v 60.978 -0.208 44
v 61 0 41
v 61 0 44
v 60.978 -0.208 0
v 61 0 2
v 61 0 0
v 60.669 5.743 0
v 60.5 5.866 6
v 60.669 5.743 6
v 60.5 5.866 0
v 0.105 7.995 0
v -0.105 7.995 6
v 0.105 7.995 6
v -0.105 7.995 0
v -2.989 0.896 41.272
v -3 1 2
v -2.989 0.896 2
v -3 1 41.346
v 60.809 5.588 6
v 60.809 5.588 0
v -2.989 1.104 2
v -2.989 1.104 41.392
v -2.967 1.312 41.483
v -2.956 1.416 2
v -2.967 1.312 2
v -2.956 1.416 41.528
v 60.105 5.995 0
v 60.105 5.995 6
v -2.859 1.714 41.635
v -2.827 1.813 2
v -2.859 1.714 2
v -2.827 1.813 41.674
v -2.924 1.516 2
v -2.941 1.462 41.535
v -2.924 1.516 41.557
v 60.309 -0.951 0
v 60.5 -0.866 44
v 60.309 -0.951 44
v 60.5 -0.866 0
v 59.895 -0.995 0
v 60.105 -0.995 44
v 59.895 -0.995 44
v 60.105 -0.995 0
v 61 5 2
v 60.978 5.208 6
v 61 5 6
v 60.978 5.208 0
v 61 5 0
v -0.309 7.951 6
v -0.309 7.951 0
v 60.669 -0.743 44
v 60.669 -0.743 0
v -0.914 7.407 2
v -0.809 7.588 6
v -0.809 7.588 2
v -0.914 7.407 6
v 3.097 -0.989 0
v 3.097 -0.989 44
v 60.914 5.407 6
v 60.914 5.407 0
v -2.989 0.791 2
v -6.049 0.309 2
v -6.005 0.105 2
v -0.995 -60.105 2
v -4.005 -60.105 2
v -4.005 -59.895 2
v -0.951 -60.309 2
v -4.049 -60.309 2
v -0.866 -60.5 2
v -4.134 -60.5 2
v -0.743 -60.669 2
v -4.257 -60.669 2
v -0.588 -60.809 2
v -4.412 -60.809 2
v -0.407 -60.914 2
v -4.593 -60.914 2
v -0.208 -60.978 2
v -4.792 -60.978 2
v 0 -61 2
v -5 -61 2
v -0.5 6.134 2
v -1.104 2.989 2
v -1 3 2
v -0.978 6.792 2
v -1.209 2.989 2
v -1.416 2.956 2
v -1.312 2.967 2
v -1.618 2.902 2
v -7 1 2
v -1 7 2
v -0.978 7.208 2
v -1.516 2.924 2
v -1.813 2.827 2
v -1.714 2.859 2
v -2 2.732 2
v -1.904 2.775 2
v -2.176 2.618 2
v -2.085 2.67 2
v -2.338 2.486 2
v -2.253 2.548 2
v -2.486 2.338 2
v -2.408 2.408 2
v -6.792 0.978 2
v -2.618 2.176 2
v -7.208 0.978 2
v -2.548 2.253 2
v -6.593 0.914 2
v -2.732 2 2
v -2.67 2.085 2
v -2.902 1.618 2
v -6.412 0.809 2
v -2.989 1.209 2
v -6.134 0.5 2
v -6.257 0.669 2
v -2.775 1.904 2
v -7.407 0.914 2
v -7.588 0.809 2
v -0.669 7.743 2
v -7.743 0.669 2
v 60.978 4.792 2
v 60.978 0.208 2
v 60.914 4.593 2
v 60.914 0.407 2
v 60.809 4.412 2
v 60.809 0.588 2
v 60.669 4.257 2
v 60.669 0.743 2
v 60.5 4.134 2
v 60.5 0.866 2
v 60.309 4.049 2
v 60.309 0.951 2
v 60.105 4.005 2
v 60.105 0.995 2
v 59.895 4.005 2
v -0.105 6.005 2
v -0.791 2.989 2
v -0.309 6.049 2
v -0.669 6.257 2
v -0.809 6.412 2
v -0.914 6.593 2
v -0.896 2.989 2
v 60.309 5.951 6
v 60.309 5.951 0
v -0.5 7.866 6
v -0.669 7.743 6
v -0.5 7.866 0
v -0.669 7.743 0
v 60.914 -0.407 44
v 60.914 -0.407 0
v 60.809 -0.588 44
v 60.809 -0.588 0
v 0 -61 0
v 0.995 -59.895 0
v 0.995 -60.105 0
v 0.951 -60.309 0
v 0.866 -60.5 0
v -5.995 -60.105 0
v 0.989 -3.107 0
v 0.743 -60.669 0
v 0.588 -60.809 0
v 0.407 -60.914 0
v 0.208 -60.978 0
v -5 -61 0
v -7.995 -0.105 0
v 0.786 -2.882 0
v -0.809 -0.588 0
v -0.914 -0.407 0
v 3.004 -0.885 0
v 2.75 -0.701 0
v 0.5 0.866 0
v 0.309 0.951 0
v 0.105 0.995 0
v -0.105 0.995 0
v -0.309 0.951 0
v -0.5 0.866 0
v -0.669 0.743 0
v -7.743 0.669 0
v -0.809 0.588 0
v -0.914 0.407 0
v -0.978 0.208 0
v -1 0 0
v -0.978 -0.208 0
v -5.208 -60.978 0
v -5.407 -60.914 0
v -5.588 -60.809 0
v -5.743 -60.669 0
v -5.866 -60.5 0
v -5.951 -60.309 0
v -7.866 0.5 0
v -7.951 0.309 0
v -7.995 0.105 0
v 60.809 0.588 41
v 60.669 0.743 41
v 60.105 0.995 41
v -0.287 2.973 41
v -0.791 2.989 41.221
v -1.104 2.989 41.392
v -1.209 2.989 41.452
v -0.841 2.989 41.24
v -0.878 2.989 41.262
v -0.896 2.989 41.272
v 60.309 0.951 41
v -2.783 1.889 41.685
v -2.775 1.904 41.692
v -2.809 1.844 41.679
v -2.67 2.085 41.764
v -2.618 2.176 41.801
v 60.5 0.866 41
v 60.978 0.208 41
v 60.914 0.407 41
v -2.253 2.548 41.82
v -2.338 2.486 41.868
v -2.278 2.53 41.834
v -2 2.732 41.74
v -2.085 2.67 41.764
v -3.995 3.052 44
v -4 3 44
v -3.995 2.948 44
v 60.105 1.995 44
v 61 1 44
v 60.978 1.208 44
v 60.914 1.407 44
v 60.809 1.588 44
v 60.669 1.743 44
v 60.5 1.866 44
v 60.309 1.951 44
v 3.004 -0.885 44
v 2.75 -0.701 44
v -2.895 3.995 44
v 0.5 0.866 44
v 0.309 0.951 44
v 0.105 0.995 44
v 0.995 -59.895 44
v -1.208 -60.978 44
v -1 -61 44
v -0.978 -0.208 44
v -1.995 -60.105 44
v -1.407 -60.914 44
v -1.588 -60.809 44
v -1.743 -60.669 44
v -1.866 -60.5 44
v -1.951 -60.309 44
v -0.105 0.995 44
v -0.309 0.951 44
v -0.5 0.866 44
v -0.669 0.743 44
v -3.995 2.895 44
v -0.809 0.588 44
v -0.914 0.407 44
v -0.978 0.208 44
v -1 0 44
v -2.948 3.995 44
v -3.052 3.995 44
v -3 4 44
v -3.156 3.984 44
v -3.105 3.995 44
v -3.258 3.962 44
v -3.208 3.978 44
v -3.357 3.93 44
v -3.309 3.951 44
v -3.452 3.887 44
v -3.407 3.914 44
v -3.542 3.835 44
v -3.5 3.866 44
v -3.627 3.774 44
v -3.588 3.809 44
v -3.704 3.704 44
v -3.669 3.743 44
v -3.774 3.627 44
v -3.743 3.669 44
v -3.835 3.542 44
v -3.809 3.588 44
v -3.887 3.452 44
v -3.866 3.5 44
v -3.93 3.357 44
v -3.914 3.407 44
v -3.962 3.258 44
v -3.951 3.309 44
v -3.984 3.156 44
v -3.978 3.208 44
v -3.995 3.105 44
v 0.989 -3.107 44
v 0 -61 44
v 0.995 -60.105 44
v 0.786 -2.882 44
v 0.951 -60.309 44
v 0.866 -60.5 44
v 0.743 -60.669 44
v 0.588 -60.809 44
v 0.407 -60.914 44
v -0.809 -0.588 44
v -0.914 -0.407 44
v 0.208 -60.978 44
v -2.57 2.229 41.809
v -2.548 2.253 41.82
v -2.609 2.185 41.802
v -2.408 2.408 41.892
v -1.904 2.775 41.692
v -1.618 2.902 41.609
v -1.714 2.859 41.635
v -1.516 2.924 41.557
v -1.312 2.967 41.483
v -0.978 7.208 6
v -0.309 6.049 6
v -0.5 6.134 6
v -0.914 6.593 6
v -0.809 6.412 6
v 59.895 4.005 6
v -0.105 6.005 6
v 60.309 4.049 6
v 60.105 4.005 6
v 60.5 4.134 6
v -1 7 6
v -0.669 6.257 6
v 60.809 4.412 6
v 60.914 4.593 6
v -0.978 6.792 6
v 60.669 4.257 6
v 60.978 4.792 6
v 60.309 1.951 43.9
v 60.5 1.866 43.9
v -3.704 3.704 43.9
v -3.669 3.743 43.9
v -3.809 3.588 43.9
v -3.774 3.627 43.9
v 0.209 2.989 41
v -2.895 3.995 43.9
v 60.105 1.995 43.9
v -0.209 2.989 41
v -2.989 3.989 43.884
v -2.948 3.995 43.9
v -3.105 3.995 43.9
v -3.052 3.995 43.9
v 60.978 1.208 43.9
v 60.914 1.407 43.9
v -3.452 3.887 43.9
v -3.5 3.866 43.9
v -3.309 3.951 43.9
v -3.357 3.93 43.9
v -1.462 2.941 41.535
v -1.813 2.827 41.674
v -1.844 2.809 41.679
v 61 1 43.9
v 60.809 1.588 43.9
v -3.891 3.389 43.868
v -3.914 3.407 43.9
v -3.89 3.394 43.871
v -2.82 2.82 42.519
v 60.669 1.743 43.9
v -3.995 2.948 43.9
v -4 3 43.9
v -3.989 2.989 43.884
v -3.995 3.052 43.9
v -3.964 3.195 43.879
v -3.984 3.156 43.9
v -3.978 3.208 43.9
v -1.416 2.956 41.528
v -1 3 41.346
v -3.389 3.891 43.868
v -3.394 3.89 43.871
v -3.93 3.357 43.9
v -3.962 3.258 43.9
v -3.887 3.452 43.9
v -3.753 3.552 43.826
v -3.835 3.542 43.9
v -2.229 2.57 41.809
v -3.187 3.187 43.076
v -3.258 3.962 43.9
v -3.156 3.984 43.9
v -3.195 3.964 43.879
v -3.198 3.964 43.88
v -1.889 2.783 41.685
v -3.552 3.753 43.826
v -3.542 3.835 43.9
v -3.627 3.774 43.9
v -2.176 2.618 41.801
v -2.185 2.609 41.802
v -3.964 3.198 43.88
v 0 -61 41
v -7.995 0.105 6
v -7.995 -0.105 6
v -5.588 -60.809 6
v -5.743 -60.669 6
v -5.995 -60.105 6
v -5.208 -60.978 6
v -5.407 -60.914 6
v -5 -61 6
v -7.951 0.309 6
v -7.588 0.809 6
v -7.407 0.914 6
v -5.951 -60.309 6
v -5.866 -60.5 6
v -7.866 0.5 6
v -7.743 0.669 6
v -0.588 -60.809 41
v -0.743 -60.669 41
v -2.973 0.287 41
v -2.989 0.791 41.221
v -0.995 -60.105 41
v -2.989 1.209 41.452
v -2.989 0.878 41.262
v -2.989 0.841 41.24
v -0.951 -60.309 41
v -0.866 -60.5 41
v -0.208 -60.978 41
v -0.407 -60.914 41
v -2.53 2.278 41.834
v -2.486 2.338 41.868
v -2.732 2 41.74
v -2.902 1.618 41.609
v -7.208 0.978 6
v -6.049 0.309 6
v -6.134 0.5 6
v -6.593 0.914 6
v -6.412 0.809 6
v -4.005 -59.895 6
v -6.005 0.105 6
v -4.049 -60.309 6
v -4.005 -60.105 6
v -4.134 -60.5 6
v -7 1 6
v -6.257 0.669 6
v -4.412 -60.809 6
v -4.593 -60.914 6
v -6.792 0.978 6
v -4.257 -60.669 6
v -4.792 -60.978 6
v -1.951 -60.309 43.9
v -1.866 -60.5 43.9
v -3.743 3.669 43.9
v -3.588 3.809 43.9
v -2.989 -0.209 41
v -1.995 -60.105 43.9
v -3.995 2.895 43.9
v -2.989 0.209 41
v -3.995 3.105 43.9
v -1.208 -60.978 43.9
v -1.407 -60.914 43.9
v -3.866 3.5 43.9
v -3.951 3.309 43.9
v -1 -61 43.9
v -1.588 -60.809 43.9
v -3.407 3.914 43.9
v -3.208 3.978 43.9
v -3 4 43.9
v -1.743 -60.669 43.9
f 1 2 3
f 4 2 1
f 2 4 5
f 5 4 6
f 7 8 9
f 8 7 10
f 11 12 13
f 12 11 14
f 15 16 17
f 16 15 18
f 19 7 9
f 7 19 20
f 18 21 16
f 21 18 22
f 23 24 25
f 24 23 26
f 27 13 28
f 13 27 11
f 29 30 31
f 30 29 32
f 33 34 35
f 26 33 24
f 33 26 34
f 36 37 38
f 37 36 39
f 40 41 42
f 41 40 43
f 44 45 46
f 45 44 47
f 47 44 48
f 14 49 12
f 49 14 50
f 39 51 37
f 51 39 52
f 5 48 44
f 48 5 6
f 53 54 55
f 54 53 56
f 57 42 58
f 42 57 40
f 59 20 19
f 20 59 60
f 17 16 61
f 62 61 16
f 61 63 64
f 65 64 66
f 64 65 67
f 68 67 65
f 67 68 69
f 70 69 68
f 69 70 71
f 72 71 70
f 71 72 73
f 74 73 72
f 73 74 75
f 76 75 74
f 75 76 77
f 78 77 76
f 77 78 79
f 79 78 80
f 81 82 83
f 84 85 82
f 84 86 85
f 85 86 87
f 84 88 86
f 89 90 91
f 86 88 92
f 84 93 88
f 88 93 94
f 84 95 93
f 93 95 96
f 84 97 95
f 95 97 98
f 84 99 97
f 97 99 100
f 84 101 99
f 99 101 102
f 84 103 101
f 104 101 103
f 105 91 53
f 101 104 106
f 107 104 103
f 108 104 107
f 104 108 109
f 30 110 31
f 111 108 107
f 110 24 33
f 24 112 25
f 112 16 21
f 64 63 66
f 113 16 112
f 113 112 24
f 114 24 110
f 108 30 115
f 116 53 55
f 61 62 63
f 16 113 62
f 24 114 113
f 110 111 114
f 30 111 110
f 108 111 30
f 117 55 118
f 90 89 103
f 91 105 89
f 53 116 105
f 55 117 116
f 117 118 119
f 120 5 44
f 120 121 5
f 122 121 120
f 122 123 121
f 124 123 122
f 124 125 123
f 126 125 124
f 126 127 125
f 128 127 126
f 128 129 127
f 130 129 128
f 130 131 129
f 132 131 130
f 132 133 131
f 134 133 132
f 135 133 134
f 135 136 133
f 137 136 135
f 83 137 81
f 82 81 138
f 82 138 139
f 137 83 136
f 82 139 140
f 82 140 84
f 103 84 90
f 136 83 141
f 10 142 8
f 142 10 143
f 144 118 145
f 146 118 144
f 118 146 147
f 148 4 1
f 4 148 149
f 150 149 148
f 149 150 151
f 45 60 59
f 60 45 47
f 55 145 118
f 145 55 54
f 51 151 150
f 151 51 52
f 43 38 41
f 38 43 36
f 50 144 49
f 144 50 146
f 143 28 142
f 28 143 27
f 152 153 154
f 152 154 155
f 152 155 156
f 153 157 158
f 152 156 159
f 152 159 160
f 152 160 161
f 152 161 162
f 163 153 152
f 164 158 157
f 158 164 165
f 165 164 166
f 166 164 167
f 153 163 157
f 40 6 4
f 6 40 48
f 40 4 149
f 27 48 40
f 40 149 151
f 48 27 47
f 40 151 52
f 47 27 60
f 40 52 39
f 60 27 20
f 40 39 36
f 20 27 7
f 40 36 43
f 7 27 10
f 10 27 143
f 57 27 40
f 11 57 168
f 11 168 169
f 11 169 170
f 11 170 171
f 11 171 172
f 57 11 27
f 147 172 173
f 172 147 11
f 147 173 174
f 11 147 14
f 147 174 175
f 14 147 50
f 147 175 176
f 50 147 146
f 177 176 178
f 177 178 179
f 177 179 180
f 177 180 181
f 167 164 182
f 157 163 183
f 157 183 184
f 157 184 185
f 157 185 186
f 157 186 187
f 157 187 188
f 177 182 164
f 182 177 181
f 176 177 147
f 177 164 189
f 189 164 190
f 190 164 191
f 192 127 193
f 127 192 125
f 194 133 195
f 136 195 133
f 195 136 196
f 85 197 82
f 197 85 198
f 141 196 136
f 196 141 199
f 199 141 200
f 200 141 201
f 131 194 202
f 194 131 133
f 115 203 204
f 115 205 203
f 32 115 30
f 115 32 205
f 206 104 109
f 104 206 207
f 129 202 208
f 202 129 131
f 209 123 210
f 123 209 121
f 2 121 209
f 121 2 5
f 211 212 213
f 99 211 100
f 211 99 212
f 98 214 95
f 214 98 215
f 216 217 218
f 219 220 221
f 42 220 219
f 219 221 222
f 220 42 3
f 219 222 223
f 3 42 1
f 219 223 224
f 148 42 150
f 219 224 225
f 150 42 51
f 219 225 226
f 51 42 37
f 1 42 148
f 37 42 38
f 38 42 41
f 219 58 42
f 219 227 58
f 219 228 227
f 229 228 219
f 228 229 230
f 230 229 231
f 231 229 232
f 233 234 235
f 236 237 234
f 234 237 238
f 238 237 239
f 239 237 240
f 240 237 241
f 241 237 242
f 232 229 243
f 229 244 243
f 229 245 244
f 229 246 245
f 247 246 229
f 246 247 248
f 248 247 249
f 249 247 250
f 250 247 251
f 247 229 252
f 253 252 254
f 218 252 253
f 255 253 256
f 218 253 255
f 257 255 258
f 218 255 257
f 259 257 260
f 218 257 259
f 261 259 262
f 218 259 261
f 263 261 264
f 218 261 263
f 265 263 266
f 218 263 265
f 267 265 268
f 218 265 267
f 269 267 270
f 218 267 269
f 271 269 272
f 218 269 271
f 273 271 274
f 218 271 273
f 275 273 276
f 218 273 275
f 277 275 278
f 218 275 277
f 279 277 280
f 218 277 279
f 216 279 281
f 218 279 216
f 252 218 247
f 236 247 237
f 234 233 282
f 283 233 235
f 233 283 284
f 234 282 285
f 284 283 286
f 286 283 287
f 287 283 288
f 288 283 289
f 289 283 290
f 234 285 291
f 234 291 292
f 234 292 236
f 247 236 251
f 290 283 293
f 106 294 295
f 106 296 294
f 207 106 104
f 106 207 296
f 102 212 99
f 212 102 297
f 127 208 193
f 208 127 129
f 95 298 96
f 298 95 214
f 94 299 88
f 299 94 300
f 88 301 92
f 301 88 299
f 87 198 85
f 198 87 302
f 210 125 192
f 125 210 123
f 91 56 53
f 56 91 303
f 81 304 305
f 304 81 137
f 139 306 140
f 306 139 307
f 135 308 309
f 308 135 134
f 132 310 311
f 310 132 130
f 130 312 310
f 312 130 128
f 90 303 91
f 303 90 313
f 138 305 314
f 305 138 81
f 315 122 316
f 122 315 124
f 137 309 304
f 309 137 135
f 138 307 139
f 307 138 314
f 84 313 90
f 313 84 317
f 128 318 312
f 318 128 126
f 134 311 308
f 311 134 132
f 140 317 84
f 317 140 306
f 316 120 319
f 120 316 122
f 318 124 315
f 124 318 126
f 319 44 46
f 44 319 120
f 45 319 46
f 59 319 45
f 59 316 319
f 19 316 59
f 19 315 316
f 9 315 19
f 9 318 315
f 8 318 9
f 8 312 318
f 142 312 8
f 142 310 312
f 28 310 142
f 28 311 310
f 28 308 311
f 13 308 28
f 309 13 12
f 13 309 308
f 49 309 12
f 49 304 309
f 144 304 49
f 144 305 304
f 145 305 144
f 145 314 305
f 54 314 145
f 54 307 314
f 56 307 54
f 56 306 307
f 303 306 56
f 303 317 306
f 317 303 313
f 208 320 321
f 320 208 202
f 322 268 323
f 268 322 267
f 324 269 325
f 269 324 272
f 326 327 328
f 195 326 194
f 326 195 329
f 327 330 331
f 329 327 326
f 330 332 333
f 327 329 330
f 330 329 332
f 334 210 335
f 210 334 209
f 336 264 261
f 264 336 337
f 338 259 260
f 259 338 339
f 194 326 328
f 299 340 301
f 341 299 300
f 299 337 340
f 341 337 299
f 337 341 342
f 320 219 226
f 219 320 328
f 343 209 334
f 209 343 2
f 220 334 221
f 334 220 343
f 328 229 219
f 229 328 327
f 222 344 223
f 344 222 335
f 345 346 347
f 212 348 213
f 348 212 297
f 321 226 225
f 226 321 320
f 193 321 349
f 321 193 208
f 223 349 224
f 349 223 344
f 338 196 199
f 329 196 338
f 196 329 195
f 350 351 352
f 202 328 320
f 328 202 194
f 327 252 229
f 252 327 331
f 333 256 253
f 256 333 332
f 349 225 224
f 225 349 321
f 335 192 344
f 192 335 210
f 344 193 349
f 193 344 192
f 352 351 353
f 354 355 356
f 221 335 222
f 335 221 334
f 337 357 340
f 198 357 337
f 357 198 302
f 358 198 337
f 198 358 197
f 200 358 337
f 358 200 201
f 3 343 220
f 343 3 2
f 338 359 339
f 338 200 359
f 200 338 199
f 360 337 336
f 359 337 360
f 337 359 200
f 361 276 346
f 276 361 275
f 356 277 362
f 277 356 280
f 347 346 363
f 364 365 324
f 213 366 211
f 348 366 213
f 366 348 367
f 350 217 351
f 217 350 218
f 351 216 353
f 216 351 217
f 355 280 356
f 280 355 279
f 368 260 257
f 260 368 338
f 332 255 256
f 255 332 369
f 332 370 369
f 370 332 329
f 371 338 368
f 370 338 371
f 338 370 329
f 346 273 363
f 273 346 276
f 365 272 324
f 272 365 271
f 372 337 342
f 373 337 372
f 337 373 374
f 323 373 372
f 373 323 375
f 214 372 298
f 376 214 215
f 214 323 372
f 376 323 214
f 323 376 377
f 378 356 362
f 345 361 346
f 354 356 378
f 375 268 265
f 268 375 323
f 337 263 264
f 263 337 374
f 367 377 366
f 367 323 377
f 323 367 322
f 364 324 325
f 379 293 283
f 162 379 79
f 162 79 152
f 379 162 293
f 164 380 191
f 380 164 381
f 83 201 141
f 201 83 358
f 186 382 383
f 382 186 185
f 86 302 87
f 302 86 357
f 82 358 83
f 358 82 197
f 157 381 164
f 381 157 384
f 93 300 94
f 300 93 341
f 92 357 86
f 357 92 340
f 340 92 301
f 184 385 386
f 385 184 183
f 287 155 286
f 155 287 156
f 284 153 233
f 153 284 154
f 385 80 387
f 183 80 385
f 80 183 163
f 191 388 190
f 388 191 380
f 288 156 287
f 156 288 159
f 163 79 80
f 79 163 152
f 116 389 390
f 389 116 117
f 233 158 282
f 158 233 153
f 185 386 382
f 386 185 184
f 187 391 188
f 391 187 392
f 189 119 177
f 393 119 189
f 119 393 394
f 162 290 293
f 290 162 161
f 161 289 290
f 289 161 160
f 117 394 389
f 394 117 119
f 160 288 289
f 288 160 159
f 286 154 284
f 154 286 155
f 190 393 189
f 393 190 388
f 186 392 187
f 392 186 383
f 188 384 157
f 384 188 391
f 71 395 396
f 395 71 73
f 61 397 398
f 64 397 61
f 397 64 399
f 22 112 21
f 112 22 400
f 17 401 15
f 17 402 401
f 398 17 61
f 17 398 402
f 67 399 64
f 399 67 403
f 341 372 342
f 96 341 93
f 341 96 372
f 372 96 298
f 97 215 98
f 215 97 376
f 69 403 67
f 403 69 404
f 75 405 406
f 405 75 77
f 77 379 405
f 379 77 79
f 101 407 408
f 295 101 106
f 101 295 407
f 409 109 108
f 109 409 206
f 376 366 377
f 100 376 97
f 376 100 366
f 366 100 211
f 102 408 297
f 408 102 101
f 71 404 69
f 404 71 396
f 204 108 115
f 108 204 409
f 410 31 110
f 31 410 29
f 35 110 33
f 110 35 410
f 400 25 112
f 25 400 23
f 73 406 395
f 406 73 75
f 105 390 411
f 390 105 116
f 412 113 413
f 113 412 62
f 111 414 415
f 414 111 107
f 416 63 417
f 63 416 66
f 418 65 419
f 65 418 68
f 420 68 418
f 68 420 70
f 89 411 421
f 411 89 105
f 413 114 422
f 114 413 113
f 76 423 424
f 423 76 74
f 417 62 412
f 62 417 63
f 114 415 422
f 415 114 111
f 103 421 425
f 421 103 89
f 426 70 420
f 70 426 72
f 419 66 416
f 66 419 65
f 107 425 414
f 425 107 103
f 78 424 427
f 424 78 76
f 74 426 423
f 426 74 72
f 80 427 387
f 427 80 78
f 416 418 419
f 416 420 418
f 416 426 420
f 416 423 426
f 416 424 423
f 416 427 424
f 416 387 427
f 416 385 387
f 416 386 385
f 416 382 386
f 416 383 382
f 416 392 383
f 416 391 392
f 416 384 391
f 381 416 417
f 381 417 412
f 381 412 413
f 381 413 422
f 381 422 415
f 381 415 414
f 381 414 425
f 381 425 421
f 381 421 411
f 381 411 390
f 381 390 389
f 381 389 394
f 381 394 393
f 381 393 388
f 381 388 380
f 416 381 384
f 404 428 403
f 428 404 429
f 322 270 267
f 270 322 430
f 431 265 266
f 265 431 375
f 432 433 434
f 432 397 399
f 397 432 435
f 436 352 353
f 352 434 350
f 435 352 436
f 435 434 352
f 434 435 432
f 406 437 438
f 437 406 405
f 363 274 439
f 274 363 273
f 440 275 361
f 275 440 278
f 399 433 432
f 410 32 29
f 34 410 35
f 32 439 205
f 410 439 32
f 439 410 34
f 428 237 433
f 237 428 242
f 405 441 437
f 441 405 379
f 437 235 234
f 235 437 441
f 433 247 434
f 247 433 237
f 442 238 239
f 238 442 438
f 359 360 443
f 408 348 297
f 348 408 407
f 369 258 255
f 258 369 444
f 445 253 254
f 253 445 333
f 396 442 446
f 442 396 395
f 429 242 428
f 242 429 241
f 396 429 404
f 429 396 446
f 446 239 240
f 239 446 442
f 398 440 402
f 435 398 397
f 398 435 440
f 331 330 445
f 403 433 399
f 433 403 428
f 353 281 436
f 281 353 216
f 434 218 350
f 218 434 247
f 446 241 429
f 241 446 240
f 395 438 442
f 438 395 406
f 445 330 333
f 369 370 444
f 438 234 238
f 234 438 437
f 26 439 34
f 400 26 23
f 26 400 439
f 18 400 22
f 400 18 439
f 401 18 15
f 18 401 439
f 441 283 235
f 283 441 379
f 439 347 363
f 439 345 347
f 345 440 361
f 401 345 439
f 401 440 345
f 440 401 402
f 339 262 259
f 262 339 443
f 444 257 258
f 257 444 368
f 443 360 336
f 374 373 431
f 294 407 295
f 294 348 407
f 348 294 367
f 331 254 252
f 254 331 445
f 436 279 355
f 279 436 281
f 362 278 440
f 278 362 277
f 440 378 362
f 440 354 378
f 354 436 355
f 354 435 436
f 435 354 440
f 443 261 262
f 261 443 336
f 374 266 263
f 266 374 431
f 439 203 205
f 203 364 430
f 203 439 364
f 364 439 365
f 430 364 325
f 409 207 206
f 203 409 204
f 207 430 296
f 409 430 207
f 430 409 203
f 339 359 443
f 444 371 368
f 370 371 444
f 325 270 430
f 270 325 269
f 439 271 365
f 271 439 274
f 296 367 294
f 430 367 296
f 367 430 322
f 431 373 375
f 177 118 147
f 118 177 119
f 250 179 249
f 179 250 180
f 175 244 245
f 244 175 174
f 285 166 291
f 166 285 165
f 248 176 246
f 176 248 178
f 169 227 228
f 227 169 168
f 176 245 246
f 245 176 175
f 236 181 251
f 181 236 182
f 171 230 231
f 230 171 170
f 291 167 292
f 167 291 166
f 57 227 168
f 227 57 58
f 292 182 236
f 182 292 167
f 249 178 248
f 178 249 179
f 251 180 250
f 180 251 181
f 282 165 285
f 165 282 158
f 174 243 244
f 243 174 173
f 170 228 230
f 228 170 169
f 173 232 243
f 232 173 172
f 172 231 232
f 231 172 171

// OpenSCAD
// How wide is the strap and any extra play you want added
StrapWidth = 40;
// Space for the gap for the hook to hold the clamp corner on the strap
StrapThickness = 3;

// Minimum Thickness of the clamp corner body. It will be twice as thick in the corner
ClampThickness = 2;
// How long to make the clamp from corner to end
ClampLength = 60 ;

// Angle too be clamped
ClampAngle = 90;



difference()
{
	CornerBracket();
	// Make a spot for the glue to sqeeze out
	hull()
	{	
		cylinder(h = StrapWidth + ClampThickness * 2, r=ClampThickness * .5 , $fs=0.01);	
		translate([ClampThickness  , -ClampThickness   , 0]) cylinder(h = StrapWidth + ClampThickness * 2, r=ClampThickness * .75 , $fs=0.01);	
	}


}

module CornerBracket()
{
	frame();
	rotate(a = ClampAngle, v = [ 0, 0, -1]) mirror([0, 1, 0]) frame();
	
	hull ()
	{
		OutsideCorner();
		rotate(a = ClampAngle, v = [ 0, 0, -1]) mirror([0, 1, 0]) OutsideCorner();
	}
}		

module frame ()
{
 	//Base
     hull(){
		translate(v = [ClampLength, 0, 0]) cylinder(h = ClampThickness, r=ClampThickness * .5, $fs=0.01);
		translate(v = [-ClampThickness * .5, ClampThickness * .5, 0]) cylinder(h = ClampThickness, r=ClampThickness , $fs=0.01);	
		translate(v = [0,  (ClampThickness  * 2 + StrapThickness)  , 0])  cylinder(h = ClampThickness , r=ClampThickness * .5 , $fs=0.01);
		translate(v = [ClampLength,  (ClampThickness + StrapThickness) , 0])  cylinder(h = ClampThickness , r=ClampThickness * .5, $fs=0.01);
	}

       //Sides
	hull(){
		// Narrow side
		translate(v = [ClampLength, 0, 0]) cylinder(h = StrapWidth + ClampThickness * 2, r=ClampThickness * .5, $fs=0.01);
		// Wide side
		translate(v = [-ClampThickness * .5, ClampThickness * .5, 0]) cylinder(h = StrapWidth + ClampThickness * 2, r=ClampThickness , $fs=0.01);	
	}
	//Short Side
	hull(){
		translate(v = [0,  (ClampThickness  * 2 + StrapThickness)  , 0])  cylinder(h = StrapWidth * .1 + ClampThickness , r=ClampThickness  * .5, $fs=0.01);
		translate(v = [ClampLength,  (ClampThickness + StrapThickness) , 0])  cylinder(h = StrapWidth * .1 + ClampThickness , r=ClampThickness * .5, $fs=0.01);
	}
	//Upper step Side
	hull(){
		// inline part
		translate(v = [0,  ClampThickness *.5  , StrapWidth + ClampThickness * 2 - StrapThickness])  cylinder(h = StrapThickness , r=ClampThickness , $fs=0.01);
		translate(v = [ClampLength,  0  , StrapWidth + ClampThickness * 2 - StrapThickness])  cylinder(h = StrapThickness , r=ClampThickness * .5, $fs=0.01);
		// Outside step part
		translate(v = [-ClampThickness * 1.5,  ClampThickness * 1.5 , StrapWidth + ClampThickness * 2 - .1])  cylinder(h = .1 , r=ClampThickness  * .5, $fs=0.01);
		translate(v = [ClampLength,  ClampThickness *.5  , StrapWidth + ClampThickness * 2 - .1])  cylinder(h = .1 , r=ClampThickness * .5, $fs=0.01);
	}
}

module OutsideCorner()
{
	cylinder(h = ClampThickness, r=ClampThickness * .5 , $fs=0.01);	
	translate(v = [0,  (ClampThickness  * 2 + StrapThickness)  , 0])  cylinder(h = ClampThickness , r=ClampThickness * .5 , $fs=0.01);
}
